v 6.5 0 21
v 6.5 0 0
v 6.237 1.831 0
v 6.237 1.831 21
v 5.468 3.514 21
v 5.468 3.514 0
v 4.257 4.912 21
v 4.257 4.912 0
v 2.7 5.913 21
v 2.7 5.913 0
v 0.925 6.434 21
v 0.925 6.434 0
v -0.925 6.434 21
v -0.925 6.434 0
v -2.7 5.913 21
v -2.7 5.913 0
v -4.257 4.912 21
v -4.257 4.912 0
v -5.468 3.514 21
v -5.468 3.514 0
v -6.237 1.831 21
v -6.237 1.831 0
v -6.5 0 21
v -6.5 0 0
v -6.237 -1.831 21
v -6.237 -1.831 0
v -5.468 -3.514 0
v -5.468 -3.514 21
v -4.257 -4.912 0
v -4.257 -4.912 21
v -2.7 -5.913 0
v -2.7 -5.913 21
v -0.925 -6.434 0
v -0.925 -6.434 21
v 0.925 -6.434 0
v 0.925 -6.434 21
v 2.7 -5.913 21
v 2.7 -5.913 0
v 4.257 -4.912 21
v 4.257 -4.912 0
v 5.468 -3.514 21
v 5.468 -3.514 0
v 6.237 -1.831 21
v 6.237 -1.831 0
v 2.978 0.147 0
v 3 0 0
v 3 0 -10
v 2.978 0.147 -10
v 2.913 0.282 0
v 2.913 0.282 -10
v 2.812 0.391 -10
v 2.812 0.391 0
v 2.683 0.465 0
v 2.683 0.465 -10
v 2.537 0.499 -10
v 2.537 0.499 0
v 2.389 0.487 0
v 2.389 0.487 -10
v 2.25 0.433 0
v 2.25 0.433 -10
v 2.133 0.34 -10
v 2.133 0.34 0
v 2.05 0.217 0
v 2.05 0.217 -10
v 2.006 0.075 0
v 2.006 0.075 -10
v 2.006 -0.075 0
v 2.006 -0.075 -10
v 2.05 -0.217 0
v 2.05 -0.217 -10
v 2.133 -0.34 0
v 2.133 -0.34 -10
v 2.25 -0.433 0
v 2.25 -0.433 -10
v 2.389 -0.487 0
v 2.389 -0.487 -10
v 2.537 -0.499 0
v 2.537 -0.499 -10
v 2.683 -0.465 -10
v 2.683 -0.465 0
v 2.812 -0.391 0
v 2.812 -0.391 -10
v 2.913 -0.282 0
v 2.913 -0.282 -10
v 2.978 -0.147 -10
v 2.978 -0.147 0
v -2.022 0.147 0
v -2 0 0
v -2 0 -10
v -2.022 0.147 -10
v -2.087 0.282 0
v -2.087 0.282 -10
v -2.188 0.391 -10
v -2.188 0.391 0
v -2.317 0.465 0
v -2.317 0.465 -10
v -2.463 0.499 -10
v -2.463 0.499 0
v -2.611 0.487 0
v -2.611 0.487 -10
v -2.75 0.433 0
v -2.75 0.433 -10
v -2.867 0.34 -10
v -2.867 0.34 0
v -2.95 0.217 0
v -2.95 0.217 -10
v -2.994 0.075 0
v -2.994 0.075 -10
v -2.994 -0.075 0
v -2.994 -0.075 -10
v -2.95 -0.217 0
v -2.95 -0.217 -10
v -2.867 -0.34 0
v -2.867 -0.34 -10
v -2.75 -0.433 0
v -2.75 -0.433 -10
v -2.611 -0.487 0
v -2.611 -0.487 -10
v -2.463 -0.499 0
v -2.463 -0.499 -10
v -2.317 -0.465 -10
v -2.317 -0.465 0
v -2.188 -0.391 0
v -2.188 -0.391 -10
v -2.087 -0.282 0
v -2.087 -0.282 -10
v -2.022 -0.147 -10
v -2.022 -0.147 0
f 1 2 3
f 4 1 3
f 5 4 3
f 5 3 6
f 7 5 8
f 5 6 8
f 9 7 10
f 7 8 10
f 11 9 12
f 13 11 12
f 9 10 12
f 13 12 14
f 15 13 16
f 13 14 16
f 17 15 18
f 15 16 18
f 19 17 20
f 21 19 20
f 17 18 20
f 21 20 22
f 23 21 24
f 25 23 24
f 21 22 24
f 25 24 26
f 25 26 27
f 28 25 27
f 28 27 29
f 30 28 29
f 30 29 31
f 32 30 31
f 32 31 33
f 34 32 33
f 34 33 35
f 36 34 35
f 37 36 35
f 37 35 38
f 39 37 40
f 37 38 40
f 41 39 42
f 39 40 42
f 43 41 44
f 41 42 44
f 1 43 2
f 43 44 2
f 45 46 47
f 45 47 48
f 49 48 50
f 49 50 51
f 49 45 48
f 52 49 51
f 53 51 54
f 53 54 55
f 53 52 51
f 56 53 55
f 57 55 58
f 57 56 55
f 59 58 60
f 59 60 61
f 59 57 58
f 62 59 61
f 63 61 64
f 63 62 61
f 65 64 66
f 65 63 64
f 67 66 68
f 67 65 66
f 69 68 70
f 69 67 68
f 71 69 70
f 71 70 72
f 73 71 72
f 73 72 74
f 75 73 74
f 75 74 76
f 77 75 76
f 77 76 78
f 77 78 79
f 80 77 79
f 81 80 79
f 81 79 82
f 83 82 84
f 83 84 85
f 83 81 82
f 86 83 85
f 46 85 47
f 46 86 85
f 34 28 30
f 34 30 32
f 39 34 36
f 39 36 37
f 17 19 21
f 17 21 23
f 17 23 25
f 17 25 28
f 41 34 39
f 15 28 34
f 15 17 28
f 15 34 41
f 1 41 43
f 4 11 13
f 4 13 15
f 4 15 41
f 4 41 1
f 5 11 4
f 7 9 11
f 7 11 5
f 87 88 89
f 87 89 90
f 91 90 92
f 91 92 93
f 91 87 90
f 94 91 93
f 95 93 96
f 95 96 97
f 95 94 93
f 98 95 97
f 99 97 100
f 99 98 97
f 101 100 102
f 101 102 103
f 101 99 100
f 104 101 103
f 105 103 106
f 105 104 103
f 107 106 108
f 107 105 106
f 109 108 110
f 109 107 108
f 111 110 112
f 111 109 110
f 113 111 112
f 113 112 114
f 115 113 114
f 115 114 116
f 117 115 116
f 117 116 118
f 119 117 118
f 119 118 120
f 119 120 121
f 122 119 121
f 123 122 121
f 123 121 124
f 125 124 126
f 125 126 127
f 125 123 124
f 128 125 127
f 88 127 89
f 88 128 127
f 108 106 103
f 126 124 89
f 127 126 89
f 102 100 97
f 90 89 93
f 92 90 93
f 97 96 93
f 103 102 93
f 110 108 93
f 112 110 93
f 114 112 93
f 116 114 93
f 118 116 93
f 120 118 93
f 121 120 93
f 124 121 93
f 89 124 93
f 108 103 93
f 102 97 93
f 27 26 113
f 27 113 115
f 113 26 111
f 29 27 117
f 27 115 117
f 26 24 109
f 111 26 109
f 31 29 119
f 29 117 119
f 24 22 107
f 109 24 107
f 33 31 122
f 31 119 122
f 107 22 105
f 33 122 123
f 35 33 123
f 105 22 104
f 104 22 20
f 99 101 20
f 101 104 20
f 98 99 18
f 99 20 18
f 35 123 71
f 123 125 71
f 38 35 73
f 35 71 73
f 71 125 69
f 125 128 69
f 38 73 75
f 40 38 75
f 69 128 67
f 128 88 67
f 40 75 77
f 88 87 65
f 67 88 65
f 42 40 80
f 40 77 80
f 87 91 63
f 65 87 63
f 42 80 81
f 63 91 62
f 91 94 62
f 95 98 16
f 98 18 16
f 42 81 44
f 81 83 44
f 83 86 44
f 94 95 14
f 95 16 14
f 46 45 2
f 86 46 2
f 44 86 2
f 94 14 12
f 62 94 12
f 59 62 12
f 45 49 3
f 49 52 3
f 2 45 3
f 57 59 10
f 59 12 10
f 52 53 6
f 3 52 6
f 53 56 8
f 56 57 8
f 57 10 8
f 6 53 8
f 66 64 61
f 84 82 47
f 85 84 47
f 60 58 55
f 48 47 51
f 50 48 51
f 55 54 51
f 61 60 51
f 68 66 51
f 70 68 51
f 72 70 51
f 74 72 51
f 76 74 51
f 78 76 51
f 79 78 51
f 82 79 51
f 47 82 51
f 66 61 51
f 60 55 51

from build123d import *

# Parameters (mm, degrees)
F0_R     = 6.5
F1_DEPTH = 21
F2_R     = 0.5
F3_DEPTH = 10


with BuildPart() as f1:
    # F0 (on Top) → F1 (new body)
    with BuildSketch(Plane.XY):
        Circle(F0_R)
    extrude(amount=F1_DEPTH)

    # F2 (on Top) → F3 (join)
    with BuildSketch(Plane.XY):
        with Locations((-2.5, 0)):
            Circle(F2_R)
        with Locations((2.5, 0)):
            Circle(F2_R)
    extrude(amount=-F3_DEPTH)


solid = f1.part
